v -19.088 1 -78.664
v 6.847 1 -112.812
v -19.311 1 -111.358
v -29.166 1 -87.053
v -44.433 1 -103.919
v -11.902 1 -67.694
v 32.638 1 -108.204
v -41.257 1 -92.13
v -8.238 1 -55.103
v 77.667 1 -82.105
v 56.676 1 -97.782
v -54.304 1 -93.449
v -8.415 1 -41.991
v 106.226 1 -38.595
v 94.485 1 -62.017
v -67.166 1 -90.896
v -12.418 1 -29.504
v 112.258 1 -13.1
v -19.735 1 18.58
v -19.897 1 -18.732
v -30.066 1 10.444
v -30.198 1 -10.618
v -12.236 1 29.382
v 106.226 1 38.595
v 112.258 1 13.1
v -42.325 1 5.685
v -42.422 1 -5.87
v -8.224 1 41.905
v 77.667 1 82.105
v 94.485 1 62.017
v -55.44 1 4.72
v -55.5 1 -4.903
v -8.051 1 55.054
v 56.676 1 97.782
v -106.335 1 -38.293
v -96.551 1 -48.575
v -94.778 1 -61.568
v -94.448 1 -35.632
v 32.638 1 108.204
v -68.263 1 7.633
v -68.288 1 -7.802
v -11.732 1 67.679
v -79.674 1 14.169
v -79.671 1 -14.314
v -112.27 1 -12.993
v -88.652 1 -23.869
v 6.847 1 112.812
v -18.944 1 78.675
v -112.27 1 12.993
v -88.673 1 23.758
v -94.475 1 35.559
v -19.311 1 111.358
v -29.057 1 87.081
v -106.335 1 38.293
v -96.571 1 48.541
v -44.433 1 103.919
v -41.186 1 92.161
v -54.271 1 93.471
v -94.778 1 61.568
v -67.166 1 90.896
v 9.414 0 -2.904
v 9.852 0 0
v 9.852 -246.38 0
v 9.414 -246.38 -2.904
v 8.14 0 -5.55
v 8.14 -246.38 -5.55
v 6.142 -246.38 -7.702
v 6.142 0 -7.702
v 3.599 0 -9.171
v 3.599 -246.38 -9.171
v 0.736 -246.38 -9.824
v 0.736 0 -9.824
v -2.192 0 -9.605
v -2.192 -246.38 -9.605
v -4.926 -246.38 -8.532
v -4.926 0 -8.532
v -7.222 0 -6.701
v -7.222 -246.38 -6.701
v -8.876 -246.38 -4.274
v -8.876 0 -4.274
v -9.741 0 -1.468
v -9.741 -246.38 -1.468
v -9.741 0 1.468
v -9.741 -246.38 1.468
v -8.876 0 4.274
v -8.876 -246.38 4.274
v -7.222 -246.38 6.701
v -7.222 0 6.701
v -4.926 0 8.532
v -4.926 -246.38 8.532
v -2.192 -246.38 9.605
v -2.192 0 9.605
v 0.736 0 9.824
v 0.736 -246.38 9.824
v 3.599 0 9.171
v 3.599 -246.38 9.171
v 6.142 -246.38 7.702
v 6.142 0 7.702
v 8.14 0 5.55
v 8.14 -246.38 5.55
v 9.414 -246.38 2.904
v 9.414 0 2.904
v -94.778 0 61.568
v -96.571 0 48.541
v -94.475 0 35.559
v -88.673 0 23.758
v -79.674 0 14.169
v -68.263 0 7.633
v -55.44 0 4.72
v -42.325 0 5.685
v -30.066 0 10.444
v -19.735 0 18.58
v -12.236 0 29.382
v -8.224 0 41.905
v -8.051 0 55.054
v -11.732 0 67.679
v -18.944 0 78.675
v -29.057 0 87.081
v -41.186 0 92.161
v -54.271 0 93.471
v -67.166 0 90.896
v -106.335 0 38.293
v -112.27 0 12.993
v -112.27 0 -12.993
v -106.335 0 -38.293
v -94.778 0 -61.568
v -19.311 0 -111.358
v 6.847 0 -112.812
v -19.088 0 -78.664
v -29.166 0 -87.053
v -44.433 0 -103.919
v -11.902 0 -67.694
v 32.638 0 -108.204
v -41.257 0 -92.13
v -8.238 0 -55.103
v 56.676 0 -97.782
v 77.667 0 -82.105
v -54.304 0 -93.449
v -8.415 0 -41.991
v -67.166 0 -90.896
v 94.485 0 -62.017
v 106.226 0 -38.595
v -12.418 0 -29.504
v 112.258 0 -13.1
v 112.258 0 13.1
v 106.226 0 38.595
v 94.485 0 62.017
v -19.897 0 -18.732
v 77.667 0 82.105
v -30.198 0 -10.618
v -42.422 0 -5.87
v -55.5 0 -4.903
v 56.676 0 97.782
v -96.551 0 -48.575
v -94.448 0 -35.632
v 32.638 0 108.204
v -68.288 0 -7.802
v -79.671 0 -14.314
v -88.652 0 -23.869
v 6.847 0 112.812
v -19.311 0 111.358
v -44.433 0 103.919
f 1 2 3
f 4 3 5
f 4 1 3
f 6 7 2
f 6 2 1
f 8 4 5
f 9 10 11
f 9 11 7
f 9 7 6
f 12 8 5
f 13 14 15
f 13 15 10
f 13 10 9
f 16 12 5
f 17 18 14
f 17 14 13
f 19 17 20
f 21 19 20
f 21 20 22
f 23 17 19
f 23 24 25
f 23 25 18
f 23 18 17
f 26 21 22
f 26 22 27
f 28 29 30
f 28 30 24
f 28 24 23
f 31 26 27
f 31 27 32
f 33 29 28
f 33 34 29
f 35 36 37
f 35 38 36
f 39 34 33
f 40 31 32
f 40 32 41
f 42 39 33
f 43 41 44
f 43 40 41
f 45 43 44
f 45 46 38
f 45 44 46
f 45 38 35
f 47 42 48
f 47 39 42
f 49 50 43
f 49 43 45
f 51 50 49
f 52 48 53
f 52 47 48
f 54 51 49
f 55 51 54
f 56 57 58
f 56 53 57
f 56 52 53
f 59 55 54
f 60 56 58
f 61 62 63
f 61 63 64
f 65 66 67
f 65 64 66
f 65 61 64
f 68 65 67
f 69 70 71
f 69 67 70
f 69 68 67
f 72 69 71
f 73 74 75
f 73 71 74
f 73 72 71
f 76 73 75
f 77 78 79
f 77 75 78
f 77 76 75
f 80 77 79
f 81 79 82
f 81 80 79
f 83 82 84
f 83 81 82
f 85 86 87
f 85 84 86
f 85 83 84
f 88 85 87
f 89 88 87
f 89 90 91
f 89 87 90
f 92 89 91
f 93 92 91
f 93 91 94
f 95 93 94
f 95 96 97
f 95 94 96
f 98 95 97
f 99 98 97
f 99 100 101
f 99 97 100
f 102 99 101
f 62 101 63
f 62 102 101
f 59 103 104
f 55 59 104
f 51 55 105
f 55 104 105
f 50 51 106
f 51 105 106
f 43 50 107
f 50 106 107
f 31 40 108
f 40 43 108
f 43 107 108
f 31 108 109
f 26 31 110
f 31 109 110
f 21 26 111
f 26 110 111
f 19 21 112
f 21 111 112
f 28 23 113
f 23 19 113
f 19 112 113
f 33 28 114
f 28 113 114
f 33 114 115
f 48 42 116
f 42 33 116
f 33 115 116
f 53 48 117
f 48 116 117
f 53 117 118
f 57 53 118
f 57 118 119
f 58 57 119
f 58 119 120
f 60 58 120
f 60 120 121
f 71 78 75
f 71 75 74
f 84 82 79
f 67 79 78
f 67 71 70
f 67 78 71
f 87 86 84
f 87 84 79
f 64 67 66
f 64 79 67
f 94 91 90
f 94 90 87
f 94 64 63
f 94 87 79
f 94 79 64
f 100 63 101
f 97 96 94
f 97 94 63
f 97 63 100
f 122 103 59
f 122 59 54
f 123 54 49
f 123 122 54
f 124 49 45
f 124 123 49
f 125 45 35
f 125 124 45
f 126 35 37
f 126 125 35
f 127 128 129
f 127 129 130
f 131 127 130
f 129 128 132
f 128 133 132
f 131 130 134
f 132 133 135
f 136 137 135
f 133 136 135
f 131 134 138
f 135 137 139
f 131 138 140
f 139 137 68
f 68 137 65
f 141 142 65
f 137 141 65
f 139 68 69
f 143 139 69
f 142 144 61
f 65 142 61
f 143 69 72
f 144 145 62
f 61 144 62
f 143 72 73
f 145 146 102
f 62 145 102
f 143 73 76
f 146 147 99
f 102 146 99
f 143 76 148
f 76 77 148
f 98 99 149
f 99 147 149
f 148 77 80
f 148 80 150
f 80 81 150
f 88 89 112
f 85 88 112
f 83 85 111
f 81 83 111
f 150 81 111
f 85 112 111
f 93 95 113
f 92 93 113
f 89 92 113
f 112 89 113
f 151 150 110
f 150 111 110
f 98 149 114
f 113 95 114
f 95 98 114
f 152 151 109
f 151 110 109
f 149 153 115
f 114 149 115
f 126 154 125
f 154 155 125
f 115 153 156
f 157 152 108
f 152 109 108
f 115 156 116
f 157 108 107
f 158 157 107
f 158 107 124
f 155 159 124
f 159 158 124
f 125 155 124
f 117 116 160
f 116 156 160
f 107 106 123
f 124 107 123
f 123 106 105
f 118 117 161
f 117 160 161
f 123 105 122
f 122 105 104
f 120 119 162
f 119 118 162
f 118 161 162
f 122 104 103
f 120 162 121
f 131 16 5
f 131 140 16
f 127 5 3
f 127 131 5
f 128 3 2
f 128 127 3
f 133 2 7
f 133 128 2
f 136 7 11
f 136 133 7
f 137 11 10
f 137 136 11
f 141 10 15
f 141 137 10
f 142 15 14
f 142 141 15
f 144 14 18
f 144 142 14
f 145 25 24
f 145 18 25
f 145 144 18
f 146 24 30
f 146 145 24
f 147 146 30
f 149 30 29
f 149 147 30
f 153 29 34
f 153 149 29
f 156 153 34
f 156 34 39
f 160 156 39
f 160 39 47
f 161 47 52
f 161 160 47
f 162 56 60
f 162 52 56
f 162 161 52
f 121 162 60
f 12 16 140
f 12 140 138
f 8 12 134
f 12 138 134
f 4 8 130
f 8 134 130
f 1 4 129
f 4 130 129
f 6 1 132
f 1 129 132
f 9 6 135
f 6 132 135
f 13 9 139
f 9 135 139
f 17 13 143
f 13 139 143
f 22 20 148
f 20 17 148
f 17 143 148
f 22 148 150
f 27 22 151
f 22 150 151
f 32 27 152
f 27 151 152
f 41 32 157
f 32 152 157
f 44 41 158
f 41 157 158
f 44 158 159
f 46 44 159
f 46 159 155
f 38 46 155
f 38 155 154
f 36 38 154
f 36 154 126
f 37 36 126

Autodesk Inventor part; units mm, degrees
ref_plane "YZ Plane" through (0, 0, 0) normal (1, 0, 0) x (0, 1, 0)
ref_plane "XZ Plane" through (0, 0, 0) normal (0, 1, 0) x (-1, 0, 0)
ref_plane "XY Plane" through (0, 0, 0) normal (0, 0, 1) x (1, 0, 0)
sketch "Sketch1" plane through (0, 0, 0) normal (0, 1, 0) x (-1, 0, 0)
  circle A0 centre (0, 0) radius 113.0198
  arc A1 (67.1662, 90.8965) -> (94.7779, 61.5681) centre (52.1094, 49.0592) ccw
  arc A2 (94.7779, -61.5681) -> (67.1662, -90.8965) centre (52.195, -49.1397) ccw
extrude "Extrusion1" add sketch "Sketch1" along normal blind 1 contours A0 A2 A1
sketch "Sketch3" plane through (0, 0, 0) normal (0, -1, 0) x (1, 0, 0)
  point P0 (0, 0)
sketch "Sketch7" plane through (0, 0, 0) normal (0, -1, 0) x (1, 0, 0)
  circle A0 centre (0, 0) radius 9.8515
extrude "Extrusion3" add sketch "Sketch7" along normal blind 246.38
properties part number "rack holder"
